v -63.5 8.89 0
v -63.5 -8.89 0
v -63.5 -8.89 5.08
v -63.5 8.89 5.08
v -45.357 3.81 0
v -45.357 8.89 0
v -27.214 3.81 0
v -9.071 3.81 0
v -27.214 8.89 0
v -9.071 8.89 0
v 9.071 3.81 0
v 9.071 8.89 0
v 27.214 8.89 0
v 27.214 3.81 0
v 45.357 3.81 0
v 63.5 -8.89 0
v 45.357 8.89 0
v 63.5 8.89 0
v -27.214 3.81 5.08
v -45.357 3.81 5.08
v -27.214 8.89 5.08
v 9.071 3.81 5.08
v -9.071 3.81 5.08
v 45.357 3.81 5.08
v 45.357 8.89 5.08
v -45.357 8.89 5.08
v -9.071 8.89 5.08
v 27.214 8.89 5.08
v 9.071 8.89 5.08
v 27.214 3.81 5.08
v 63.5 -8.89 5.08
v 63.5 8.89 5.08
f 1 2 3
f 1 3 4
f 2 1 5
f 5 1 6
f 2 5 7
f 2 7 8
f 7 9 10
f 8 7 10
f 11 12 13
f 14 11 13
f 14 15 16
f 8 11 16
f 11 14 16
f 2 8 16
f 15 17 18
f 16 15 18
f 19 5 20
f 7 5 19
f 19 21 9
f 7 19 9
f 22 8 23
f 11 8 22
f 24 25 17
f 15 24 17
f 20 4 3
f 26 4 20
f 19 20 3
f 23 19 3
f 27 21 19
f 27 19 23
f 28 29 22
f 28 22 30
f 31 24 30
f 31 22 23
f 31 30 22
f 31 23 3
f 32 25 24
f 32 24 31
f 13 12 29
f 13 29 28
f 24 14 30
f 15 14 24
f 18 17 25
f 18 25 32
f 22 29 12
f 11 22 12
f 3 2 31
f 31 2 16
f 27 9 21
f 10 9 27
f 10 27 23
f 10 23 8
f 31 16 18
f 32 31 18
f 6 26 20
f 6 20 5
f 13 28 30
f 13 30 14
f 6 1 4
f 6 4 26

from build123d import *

# Parameters (mm, degrees)
SKETCH1_W           = 127
SKETCH1_H           = 17.78
BOSS_EXTRUDE1_DEPTH = 5.08
SKETCH2_W           = 18.142857143
SKETCH2_H           = 5.08
SKETCH2_W_2         = 18.142857142
CUT_EXTRUDE1_DEPTH  = 5.08


with BuildPart() as part:
    # Sketch1 → Boss-Extrude1 (new body)
    with BuildSketch(Plane.XY):
        Rectangle(SKETCH1_W, SKETCH1_H)
    extrude(amount=BOSS_EXTRUDE1_DEPTH)

    # Sketch2 → Cut-Extrude1 (cut)
    with BuildSketch(Plane(origin=(0, 8.89, 0), x_dir=(1, 0, 0), z_dir=(0, 1, 0))):
        with Locations((36.285714285, -2.54)):
            Rectangle(SKETCH2_W, SKETCH2_H)
        with Locations((0, -2.54)):
            Rectangle(SKETCH2_W_2, SKETCH2_H)
        with Locations((-36.285714285, -2.54)):
            Rectangle(SKETCH2_W, SKETCH2_H)
    extrude(amount=-CUT_EXTRUDE1_DEPTH, mode=Mode.SUBTRACT)


solid = part.part
